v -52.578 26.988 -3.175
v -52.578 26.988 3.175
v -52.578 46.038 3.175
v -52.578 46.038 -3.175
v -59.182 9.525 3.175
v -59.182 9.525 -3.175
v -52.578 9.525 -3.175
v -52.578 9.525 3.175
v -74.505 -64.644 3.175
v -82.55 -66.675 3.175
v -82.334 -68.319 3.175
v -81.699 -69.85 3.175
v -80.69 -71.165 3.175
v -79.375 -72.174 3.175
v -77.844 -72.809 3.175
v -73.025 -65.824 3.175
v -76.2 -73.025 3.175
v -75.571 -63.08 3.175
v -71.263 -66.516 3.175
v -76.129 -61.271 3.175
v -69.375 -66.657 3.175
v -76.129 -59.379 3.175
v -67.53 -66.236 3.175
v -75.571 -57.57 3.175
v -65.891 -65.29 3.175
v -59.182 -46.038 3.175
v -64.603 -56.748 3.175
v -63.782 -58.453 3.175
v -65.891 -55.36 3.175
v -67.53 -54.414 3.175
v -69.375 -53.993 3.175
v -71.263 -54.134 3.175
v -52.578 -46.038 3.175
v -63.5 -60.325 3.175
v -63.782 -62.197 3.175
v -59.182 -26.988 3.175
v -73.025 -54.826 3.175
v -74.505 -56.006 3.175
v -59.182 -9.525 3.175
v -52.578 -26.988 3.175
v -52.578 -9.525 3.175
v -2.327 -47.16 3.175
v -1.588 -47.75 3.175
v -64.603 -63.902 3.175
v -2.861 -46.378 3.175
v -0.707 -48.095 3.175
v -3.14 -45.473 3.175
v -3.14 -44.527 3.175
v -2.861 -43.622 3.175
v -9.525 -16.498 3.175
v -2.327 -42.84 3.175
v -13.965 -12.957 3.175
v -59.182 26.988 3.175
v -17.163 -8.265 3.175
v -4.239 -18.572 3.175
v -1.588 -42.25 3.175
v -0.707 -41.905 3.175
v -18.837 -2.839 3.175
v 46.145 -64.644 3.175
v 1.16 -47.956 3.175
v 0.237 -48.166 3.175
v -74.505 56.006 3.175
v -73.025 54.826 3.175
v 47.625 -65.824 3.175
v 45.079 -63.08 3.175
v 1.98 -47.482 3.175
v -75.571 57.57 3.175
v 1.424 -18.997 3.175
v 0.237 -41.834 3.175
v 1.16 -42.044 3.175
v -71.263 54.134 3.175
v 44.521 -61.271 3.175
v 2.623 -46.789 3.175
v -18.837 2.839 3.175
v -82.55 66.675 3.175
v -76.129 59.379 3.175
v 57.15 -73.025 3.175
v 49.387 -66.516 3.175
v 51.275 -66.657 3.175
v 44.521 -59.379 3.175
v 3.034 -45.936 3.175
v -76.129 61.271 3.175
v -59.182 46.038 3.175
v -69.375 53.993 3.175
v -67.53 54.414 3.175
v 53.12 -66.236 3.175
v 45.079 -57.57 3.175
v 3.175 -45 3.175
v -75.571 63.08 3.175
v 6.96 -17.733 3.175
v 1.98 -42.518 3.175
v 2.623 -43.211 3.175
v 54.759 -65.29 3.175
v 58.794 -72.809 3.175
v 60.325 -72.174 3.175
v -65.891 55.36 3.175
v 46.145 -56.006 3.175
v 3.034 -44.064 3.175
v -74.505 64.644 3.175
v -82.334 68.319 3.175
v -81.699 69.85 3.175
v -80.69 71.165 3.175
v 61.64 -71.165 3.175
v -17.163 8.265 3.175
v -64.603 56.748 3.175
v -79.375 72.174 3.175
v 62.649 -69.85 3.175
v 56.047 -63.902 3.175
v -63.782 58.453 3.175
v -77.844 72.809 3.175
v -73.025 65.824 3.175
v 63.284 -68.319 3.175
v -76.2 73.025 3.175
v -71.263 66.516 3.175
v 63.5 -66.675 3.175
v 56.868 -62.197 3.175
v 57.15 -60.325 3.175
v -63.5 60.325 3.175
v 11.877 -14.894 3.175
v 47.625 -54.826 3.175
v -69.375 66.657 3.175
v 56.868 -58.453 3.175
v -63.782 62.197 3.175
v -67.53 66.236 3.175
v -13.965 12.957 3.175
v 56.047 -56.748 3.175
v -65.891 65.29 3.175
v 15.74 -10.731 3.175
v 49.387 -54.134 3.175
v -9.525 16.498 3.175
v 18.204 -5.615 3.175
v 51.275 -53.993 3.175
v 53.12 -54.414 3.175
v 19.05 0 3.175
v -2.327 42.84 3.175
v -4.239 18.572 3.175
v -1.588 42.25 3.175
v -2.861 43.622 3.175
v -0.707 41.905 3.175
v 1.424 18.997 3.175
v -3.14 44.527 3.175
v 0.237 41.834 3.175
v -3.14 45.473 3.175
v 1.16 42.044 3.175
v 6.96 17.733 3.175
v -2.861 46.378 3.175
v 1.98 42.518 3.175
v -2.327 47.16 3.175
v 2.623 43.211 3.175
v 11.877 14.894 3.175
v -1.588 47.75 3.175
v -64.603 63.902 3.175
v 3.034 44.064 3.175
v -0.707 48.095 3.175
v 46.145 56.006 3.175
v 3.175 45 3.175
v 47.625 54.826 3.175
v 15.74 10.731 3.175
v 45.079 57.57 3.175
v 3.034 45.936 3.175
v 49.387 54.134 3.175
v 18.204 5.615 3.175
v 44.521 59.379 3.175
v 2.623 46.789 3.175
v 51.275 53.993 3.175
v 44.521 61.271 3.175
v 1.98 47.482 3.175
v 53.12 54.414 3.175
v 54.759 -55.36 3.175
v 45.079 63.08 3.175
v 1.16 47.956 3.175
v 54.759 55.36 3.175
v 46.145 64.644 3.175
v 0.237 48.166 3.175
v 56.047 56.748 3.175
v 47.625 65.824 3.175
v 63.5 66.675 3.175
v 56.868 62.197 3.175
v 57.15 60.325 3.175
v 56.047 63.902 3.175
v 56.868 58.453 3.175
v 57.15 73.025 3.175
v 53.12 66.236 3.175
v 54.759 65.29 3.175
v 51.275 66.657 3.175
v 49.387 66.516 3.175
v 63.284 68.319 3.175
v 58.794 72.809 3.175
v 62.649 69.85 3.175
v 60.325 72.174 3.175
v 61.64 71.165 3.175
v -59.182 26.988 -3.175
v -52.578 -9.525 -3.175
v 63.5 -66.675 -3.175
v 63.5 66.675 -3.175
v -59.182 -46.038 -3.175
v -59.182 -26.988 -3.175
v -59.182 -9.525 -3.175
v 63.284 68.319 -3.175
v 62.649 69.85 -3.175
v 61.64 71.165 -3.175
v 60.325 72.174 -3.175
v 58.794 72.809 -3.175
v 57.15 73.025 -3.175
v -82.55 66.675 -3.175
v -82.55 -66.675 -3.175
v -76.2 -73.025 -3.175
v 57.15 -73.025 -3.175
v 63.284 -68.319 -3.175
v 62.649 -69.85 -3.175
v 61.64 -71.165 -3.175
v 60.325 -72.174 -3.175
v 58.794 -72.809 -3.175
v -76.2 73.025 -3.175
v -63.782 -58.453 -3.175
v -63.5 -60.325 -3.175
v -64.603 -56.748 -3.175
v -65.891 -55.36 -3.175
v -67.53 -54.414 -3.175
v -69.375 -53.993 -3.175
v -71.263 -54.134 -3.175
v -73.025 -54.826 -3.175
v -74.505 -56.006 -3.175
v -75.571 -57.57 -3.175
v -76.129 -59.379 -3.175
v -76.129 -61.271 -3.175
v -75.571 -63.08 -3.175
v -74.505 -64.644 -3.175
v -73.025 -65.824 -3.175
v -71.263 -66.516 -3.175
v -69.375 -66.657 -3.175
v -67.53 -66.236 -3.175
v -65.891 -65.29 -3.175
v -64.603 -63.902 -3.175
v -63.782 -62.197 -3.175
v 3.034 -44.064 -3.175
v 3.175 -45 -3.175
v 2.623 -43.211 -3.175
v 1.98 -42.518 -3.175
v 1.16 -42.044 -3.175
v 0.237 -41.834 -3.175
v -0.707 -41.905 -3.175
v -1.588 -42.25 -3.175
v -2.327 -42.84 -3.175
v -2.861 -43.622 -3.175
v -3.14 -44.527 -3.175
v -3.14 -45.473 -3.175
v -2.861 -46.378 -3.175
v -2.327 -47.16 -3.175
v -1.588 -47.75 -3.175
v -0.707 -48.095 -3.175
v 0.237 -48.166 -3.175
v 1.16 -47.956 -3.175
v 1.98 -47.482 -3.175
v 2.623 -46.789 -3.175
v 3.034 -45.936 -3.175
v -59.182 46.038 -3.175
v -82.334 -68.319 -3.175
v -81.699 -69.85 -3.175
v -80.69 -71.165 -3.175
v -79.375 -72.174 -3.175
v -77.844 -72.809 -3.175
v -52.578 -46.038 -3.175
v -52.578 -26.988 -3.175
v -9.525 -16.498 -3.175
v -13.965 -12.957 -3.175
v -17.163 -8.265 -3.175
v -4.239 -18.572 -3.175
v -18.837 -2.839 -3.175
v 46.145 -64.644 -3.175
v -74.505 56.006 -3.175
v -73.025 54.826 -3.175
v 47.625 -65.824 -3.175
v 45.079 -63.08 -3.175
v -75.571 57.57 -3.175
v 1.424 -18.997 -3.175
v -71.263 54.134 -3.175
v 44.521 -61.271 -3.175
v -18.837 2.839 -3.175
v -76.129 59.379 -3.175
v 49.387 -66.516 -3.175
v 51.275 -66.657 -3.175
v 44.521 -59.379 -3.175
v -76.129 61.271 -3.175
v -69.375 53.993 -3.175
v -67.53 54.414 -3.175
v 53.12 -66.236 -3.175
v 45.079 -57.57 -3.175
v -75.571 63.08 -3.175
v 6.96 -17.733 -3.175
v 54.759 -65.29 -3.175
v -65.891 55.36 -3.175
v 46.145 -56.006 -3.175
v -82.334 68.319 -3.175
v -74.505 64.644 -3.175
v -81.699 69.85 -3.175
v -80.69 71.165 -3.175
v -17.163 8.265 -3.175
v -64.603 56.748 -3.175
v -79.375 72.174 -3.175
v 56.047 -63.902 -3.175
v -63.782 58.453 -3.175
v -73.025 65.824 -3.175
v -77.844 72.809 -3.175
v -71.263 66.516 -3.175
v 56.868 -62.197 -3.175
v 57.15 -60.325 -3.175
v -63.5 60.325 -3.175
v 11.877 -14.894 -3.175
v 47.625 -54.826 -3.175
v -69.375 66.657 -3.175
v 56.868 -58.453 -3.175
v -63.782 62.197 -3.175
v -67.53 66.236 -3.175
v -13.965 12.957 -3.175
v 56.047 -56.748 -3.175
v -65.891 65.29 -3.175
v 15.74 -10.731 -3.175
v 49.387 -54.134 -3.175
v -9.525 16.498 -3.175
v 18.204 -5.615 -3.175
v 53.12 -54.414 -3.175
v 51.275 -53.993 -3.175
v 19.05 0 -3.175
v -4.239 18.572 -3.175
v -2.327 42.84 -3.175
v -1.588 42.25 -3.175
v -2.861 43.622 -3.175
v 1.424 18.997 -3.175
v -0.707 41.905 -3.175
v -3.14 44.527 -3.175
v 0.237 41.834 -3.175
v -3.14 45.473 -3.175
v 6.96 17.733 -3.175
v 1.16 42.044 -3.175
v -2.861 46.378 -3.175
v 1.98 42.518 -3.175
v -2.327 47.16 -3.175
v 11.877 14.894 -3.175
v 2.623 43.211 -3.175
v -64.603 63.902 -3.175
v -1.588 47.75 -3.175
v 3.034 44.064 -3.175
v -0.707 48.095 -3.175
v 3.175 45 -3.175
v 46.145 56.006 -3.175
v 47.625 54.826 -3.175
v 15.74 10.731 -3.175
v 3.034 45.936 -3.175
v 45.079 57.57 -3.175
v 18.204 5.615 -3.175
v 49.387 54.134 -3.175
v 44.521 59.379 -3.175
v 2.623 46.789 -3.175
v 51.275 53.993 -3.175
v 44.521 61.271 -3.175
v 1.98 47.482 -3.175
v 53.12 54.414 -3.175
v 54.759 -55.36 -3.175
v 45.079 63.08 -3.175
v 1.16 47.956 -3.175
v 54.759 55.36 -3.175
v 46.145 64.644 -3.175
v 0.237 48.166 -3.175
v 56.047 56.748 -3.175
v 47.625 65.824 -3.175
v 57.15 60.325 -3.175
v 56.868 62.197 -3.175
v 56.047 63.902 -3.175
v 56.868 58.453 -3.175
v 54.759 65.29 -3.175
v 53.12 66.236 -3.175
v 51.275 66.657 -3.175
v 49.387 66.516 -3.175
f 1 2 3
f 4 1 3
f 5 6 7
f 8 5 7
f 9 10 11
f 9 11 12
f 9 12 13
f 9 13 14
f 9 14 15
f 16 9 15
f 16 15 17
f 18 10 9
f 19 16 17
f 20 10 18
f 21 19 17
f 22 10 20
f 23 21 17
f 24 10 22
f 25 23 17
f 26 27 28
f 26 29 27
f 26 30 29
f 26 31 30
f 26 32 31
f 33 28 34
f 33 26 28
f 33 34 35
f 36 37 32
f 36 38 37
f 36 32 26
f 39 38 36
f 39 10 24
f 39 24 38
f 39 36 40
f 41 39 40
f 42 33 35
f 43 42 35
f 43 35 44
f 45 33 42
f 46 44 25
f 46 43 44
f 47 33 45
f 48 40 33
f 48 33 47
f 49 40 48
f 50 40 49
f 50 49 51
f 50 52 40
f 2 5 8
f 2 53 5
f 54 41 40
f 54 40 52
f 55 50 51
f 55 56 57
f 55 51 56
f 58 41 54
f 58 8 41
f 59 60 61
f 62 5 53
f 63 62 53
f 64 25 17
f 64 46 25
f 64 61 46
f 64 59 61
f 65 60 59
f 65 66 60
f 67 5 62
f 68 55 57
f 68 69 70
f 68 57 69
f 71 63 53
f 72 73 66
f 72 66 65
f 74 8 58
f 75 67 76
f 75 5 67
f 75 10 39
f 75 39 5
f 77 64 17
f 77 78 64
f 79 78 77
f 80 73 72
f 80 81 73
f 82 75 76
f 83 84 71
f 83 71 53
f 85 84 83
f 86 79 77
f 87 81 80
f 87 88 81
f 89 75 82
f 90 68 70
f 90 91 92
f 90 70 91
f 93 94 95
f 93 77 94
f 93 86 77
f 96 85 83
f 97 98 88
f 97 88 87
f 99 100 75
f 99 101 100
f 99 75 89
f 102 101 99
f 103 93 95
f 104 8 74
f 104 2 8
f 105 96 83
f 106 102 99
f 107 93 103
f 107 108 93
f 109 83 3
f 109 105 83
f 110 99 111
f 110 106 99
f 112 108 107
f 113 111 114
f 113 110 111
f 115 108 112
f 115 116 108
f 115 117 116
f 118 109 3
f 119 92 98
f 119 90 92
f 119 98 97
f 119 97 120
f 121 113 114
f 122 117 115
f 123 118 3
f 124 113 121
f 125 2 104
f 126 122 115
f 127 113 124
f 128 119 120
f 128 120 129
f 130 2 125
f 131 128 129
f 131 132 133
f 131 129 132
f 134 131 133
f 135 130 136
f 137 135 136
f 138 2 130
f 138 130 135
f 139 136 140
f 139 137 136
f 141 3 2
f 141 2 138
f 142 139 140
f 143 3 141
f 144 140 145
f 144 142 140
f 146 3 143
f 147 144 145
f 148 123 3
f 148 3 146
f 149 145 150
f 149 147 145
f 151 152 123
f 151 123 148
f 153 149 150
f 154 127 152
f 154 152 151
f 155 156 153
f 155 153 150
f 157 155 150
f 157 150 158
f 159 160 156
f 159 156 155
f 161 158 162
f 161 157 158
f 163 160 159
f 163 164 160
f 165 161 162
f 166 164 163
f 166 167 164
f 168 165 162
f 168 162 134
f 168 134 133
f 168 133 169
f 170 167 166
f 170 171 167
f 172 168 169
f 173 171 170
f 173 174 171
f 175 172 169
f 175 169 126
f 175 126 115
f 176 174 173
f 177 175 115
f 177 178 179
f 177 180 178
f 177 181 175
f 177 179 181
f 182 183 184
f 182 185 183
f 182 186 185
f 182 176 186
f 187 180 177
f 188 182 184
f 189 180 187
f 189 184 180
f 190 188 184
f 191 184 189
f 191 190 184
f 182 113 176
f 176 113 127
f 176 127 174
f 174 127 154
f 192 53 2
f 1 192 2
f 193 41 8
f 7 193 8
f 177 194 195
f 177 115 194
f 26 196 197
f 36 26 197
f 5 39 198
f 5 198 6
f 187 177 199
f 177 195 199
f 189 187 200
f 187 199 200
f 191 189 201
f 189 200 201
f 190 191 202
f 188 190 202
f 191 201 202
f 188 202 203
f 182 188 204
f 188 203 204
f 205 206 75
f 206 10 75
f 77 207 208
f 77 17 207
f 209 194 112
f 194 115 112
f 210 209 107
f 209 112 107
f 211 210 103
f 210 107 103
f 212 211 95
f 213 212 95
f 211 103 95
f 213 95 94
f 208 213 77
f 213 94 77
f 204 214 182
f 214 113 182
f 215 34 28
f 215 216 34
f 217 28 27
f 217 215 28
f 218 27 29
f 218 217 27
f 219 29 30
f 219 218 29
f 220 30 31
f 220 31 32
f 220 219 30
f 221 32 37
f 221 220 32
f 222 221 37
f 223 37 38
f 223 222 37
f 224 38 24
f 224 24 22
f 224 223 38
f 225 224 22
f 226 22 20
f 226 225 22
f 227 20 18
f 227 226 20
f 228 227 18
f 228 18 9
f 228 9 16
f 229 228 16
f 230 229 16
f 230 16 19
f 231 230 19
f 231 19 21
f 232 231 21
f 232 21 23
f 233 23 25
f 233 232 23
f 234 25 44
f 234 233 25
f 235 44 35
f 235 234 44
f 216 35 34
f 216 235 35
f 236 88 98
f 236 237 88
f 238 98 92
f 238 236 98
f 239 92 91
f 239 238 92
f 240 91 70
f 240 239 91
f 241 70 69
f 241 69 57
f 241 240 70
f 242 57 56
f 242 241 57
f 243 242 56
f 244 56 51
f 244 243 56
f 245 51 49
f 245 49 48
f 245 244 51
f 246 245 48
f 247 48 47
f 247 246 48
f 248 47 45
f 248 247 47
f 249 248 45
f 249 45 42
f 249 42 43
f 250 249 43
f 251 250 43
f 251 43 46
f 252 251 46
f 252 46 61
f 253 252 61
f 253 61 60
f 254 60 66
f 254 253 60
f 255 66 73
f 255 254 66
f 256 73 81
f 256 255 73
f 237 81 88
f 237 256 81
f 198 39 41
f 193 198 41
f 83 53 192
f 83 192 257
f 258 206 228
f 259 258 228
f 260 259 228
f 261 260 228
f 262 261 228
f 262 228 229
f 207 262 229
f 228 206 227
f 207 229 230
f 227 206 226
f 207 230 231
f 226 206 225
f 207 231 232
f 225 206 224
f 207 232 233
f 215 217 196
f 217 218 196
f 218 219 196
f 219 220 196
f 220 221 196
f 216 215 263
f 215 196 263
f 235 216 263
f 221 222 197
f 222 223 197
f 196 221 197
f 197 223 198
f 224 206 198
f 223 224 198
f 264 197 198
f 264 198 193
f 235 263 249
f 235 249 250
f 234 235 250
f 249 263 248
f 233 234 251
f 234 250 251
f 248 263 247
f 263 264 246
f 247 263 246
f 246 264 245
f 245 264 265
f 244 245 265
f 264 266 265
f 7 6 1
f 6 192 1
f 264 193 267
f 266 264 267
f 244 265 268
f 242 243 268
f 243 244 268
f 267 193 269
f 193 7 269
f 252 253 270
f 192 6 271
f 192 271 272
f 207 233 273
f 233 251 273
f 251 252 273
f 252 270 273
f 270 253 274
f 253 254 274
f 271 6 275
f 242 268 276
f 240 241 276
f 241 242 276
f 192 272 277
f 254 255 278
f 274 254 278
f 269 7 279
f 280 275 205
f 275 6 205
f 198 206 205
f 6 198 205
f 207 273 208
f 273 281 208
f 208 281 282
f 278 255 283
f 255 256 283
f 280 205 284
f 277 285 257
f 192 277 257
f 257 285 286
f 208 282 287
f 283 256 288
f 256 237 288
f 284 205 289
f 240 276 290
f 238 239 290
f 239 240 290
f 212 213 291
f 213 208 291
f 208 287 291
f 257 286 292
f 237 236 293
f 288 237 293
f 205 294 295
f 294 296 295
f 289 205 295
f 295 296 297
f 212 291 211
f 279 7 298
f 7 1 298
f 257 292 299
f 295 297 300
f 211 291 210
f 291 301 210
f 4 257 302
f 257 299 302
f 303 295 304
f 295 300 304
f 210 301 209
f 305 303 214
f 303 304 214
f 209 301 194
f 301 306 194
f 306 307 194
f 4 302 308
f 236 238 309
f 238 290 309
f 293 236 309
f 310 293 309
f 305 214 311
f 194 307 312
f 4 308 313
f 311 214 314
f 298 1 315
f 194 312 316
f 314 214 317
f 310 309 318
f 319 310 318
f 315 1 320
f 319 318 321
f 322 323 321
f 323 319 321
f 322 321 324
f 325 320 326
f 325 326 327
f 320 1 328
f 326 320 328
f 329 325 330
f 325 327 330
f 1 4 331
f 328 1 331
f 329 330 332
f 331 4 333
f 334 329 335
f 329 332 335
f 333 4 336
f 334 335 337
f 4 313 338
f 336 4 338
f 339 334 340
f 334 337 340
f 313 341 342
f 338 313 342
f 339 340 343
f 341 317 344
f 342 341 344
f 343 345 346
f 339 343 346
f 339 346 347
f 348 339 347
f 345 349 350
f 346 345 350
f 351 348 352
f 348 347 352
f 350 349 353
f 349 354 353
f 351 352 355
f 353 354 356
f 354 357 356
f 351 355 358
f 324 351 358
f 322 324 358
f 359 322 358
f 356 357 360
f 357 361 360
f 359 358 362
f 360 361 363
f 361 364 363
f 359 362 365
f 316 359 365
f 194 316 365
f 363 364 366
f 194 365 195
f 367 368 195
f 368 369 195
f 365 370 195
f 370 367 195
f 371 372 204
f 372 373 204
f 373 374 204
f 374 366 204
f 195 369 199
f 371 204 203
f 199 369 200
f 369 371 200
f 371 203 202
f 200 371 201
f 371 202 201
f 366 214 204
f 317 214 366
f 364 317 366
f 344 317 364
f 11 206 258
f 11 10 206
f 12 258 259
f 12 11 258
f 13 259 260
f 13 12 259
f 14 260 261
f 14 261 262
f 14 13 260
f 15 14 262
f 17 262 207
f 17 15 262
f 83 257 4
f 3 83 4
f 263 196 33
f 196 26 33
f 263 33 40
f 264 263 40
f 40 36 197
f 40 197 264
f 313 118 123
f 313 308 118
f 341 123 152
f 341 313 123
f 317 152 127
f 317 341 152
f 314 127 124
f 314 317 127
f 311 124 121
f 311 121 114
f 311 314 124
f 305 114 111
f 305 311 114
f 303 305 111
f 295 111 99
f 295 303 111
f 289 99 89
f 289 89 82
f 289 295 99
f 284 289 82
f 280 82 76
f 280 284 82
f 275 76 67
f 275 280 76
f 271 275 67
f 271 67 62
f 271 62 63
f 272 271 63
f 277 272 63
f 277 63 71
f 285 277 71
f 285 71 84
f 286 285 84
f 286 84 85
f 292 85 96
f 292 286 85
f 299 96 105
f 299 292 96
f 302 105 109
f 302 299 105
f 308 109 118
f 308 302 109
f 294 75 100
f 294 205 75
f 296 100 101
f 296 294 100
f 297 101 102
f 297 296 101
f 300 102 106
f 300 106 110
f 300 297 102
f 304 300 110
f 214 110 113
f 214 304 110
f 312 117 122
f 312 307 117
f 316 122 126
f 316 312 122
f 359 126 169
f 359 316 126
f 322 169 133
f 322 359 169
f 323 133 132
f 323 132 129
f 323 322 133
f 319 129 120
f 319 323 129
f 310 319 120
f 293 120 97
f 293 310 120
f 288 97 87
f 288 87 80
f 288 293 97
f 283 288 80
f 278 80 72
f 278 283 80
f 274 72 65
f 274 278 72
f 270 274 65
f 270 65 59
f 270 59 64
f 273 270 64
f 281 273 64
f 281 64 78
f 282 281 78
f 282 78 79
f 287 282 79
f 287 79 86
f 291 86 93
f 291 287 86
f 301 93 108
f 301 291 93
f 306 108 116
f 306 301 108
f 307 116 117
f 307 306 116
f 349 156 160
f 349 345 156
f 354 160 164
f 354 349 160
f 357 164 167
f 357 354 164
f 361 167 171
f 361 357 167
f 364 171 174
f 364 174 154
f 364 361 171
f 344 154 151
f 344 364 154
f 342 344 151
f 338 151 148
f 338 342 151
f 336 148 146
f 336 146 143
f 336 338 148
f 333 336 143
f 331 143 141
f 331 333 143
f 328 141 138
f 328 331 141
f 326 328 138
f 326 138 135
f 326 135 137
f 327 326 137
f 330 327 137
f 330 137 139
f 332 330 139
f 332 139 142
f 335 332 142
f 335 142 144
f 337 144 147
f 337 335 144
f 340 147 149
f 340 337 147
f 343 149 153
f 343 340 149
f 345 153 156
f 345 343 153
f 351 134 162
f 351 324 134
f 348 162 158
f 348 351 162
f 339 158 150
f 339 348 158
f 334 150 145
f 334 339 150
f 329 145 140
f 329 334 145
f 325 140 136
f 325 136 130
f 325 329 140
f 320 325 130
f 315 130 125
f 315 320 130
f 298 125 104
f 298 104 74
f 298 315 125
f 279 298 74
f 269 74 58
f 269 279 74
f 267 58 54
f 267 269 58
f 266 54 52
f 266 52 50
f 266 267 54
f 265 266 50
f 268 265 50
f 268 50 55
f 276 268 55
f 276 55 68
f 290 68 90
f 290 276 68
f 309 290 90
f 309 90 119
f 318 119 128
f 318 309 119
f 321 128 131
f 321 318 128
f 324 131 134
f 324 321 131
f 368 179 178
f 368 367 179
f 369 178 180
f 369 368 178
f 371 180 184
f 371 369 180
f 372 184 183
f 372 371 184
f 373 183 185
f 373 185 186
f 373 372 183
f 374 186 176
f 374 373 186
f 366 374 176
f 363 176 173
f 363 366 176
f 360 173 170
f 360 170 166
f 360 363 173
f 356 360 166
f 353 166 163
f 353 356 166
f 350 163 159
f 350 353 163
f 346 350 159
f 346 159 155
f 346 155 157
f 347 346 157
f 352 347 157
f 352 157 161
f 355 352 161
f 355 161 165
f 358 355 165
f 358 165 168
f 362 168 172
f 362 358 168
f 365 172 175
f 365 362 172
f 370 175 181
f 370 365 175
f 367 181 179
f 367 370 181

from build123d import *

# Parameters (mm, degrees)
SKETCH1_W           = 146.05
SKETCH1_H           = 146.05
SKETCH1_R           = 6.35
SKETCH1_R_2         = 19.05
SKETCH1_R_3         = 3.175
SKETCH1_W_2         = 6.604
SKETCH1_H_2         = 19.05
BOSS_EXTRUDE1_DEPTH = 3.175
FILLET1_R           = 6.35


with BuildPart() as part:
    # Sketch1 → Boss-Extrude1 (new body, symmetric)
    with BuildSketch(Plane.XY):
        with Locations((-9.525, 0)):
            Rectangle(SKETCH1_W, SKETCH1_H)
        with Locations((50.8, 60.325)):
            Circle(SKETCH1_R, mode=Mode.SUBTRACT)
        with Locations((50.8, -60.325)):
            Circle(SKETCH1_R, mode=Mode.SUBTRACT)
        Circle(SKETCH1_R_2, mode=Mode.SUBTRACT)
        with Locations((0, 45)):
            Circle(SKETCH1_R_3, mode=Mode.SUBTRACT)
        with Locations((0, -45)):
            Circle(SKETCH1_R_3, mode=Mode.SUBTRACT)
        with Locations((-69.85, 60.325)):
            Circle(SKETCH1_R, mode=Mode.SUBTRACT)
        with Locations((-69.85, -60.325)):
            Circle(SKETCH1_R, mode=Mode.SUBTRACT)
        with Locations((-55.88, 0)):
            Rectangle(SKETCH1_W_2, SKETCH1_H_2, mode=Mode.SUBTRACT)
        with Locations((-55.88, 36.5125)):
            Rectangle(SKETCH1_W_2, SKETCH1_H_2, mode=Mode.SUBTRACT)
        with Locations((-55.88, -36.5125)):
            Rectangle(SKETCH1_W_2, SKETCH1_H_2, mode=Mode.SUBTRACT)
    extrude(amount=BOSS_EXTRUDE1_DEPTH, both=True)

    # Fillet1
    fillet1_edges = [part.edges().sort_by_distance(p)[0] for p in [
        (-82.55, 73.025, 0),
        (63.5, 73.025, 0),
        (63.5, -73.025, 0),
        (-82.55, -73.025, 0),
    ]]
    fillet(fillet1_edges, radius=FILLET1_R)


solid = part.part
